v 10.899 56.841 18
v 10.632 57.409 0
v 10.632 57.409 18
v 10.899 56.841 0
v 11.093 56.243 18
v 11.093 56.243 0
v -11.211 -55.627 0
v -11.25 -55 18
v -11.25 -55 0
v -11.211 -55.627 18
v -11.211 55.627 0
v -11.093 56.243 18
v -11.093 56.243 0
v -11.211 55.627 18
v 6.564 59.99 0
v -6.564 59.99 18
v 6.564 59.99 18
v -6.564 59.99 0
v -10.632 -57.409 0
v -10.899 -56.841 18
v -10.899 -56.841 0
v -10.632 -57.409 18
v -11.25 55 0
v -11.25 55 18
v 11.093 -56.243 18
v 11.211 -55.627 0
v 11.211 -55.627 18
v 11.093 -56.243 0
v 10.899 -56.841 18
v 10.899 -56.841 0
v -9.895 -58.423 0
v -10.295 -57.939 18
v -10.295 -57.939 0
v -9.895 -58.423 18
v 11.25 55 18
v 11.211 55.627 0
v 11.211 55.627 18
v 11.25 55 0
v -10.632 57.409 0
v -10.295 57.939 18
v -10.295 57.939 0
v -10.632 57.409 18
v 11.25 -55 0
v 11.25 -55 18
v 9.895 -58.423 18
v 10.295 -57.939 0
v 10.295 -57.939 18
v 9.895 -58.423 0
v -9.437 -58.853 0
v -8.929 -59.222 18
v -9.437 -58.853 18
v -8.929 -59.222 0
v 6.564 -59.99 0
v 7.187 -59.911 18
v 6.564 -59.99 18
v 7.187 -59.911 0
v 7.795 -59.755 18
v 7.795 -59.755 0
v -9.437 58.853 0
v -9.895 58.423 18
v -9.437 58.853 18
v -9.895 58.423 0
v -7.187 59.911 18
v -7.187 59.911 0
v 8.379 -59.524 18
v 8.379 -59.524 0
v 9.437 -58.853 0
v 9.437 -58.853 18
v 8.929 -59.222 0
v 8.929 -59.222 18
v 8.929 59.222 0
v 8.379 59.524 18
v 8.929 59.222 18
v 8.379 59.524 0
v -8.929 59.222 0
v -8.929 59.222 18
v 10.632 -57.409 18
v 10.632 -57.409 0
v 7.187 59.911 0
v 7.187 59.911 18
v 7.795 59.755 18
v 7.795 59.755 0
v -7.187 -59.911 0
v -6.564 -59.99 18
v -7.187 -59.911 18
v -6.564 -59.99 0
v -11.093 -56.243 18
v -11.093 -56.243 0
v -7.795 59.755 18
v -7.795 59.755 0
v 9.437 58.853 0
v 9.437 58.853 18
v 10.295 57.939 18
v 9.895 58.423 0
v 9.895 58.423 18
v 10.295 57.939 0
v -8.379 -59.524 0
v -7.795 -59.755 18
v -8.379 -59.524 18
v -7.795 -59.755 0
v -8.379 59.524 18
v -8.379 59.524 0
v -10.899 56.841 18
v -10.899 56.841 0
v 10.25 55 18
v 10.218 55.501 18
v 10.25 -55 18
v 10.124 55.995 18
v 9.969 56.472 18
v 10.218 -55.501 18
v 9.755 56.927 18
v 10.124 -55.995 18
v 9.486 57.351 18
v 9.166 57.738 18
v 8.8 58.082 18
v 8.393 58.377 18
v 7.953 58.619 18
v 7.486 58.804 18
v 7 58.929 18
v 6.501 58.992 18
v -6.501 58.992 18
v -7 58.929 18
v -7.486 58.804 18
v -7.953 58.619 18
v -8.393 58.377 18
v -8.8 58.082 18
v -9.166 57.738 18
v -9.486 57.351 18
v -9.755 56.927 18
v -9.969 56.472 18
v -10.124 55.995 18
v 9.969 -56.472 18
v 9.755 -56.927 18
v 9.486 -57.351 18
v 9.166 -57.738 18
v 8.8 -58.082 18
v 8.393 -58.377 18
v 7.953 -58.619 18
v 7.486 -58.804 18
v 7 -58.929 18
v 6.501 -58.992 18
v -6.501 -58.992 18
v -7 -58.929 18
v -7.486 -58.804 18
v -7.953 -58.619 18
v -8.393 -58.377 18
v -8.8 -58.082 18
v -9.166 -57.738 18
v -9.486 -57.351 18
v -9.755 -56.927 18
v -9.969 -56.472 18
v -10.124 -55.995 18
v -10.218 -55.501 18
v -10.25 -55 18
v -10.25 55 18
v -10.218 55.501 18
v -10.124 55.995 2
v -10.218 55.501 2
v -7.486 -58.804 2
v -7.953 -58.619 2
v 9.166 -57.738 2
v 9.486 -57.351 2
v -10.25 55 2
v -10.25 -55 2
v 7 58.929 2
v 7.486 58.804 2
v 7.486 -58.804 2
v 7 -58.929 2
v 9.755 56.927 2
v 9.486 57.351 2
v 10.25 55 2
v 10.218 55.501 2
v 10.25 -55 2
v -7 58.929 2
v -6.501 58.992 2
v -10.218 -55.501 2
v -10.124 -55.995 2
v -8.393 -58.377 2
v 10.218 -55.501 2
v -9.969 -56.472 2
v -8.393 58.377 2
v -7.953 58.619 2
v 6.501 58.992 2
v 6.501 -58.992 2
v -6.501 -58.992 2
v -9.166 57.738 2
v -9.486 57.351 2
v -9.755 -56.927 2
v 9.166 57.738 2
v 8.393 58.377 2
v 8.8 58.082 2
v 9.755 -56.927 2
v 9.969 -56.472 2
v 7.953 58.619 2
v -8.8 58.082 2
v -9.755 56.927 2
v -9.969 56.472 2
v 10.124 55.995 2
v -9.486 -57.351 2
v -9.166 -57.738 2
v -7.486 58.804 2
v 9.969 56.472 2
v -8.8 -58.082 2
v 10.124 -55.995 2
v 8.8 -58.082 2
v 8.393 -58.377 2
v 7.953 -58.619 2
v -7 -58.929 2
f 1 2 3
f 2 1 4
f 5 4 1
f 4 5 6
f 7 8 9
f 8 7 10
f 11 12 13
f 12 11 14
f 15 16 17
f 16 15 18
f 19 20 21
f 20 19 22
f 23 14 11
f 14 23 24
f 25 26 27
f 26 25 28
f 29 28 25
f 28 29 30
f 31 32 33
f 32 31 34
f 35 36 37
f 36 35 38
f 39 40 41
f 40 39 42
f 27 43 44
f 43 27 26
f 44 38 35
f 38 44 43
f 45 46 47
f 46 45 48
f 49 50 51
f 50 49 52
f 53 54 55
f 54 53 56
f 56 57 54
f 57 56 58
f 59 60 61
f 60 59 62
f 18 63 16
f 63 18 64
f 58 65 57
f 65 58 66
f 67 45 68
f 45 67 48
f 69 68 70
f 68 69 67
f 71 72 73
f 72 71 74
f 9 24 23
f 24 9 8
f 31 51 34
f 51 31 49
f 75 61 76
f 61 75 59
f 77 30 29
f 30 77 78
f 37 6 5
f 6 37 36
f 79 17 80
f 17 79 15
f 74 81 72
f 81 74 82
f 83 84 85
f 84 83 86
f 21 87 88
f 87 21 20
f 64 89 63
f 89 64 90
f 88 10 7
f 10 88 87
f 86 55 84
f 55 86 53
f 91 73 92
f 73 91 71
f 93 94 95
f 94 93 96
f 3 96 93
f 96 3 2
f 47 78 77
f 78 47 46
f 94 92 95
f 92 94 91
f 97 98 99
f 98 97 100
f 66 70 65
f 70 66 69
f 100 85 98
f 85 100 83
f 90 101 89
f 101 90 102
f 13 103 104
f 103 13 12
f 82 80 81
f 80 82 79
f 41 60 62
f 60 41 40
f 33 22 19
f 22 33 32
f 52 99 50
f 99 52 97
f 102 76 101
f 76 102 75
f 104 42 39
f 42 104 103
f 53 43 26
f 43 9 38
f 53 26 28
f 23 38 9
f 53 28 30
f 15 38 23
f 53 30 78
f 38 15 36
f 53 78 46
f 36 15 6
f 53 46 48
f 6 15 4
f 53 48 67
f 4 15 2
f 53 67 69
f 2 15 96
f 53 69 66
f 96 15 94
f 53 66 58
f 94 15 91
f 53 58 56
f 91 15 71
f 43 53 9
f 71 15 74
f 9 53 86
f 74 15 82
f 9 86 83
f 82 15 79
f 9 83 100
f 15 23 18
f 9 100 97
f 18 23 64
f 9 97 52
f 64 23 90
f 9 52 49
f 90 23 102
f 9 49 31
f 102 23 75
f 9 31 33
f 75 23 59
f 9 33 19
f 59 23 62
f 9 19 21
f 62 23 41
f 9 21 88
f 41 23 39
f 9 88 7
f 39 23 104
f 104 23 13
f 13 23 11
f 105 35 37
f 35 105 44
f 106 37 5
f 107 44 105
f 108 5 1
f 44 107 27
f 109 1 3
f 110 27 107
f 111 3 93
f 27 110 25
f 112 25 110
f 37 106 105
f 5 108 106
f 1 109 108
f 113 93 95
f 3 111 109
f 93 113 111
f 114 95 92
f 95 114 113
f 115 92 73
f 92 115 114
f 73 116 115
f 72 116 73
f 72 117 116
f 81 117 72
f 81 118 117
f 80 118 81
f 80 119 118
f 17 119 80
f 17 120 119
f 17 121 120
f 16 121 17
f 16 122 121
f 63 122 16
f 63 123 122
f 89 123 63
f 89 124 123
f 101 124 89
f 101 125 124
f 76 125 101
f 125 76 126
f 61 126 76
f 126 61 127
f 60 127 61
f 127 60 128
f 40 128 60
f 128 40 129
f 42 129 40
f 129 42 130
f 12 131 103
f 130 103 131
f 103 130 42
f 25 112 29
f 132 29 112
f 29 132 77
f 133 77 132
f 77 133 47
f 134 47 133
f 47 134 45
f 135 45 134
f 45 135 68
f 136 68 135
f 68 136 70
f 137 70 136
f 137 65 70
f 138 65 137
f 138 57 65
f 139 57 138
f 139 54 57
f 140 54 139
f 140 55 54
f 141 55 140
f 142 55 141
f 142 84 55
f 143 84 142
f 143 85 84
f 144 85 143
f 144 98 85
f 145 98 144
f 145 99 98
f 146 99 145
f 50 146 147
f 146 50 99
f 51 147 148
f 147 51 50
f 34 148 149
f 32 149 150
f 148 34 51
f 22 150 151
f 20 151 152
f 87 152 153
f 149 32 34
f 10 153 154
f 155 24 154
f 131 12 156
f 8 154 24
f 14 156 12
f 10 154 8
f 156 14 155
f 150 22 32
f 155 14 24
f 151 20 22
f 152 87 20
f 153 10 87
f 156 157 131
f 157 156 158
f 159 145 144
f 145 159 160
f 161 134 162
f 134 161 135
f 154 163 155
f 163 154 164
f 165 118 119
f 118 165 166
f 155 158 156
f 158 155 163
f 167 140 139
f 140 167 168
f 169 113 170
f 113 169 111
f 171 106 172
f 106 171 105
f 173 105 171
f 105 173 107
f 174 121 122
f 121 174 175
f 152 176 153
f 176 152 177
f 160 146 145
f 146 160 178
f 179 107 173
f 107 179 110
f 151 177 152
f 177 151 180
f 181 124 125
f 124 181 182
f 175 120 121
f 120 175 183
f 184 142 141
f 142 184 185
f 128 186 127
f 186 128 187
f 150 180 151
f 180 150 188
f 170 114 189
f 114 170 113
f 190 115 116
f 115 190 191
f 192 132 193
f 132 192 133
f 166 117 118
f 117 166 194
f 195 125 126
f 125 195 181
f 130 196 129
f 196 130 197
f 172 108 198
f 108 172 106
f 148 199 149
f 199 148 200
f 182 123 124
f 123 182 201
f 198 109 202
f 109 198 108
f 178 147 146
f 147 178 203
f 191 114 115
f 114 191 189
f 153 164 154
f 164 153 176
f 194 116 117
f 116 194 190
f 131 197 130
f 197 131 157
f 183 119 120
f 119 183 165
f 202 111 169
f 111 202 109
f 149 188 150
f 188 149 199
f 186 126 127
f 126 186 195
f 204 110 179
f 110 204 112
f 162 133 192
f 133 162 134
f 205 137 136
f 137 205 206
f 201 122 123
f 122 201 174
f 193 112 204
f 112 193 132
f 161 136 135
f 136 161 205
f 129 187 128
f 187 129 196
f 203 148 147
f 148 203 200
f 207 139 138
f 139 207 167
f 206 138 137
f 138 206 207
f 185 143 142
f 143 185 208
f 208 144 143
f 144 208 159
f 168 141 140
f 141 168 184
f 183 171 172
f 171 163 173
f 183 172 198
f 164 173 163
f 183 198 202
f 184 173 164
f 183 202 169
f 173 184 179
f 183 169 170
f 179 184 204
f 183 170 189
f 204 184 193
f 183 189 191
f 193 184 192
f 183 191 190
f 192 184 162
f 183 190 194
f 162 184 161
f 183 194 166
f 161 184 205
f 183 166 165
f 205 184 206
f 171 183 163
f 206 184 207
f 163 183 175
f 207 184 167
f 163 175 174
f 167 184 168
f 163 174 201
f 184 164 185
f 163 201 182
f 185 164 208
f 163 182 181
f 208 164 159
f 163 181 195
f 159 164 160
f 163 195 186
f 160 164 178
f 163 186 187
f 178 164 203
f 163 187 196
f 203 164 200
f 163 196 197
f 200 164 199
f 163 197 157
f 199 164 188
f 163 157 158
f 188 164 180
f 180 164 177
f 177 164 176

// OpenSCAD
$fn = 50;


difference() {
	union() {
		hull() {
			translate(v = [-6.2500000000, 55.0000000000, 0]) {
				cylinder(h = 18, r = 5);
			}
			translate(v = [6.2500000000, 55.0000000000, 0]) {
				cylinder(h = 18, r = 5);
			}
			translate(v = [-6.2500000000, -55.0000000000, 0]) {
				cylinder(h = 18, r = 5);
			}
			translate(v = [6.2500000000, -55.0000000000, 0]) {
				cylinder(h = 18, r = 5);
			}
		}
	}
	union() {
		translate(v = [0, 0, 2]) {
			hull() {
				translate(v = [-6.2500000000, 55.0000000000, 0]) {
					cylinder(h = 16, r = 4);
				}
				translate(v = [6.2500000000, 55.0000000000, 0]) {
					cylinder(h = 16, r = 4);
				}
				translate(v = [-6.2500000000, -55.0000000000, 0]) {
					cylinder(h = 16, r = 4);
				}
				translate(v = [6.2500000000, -55.0000000000, 0]) {
					cylinder(h = 16, r = 4);
				}
			}
		}
	}
}
